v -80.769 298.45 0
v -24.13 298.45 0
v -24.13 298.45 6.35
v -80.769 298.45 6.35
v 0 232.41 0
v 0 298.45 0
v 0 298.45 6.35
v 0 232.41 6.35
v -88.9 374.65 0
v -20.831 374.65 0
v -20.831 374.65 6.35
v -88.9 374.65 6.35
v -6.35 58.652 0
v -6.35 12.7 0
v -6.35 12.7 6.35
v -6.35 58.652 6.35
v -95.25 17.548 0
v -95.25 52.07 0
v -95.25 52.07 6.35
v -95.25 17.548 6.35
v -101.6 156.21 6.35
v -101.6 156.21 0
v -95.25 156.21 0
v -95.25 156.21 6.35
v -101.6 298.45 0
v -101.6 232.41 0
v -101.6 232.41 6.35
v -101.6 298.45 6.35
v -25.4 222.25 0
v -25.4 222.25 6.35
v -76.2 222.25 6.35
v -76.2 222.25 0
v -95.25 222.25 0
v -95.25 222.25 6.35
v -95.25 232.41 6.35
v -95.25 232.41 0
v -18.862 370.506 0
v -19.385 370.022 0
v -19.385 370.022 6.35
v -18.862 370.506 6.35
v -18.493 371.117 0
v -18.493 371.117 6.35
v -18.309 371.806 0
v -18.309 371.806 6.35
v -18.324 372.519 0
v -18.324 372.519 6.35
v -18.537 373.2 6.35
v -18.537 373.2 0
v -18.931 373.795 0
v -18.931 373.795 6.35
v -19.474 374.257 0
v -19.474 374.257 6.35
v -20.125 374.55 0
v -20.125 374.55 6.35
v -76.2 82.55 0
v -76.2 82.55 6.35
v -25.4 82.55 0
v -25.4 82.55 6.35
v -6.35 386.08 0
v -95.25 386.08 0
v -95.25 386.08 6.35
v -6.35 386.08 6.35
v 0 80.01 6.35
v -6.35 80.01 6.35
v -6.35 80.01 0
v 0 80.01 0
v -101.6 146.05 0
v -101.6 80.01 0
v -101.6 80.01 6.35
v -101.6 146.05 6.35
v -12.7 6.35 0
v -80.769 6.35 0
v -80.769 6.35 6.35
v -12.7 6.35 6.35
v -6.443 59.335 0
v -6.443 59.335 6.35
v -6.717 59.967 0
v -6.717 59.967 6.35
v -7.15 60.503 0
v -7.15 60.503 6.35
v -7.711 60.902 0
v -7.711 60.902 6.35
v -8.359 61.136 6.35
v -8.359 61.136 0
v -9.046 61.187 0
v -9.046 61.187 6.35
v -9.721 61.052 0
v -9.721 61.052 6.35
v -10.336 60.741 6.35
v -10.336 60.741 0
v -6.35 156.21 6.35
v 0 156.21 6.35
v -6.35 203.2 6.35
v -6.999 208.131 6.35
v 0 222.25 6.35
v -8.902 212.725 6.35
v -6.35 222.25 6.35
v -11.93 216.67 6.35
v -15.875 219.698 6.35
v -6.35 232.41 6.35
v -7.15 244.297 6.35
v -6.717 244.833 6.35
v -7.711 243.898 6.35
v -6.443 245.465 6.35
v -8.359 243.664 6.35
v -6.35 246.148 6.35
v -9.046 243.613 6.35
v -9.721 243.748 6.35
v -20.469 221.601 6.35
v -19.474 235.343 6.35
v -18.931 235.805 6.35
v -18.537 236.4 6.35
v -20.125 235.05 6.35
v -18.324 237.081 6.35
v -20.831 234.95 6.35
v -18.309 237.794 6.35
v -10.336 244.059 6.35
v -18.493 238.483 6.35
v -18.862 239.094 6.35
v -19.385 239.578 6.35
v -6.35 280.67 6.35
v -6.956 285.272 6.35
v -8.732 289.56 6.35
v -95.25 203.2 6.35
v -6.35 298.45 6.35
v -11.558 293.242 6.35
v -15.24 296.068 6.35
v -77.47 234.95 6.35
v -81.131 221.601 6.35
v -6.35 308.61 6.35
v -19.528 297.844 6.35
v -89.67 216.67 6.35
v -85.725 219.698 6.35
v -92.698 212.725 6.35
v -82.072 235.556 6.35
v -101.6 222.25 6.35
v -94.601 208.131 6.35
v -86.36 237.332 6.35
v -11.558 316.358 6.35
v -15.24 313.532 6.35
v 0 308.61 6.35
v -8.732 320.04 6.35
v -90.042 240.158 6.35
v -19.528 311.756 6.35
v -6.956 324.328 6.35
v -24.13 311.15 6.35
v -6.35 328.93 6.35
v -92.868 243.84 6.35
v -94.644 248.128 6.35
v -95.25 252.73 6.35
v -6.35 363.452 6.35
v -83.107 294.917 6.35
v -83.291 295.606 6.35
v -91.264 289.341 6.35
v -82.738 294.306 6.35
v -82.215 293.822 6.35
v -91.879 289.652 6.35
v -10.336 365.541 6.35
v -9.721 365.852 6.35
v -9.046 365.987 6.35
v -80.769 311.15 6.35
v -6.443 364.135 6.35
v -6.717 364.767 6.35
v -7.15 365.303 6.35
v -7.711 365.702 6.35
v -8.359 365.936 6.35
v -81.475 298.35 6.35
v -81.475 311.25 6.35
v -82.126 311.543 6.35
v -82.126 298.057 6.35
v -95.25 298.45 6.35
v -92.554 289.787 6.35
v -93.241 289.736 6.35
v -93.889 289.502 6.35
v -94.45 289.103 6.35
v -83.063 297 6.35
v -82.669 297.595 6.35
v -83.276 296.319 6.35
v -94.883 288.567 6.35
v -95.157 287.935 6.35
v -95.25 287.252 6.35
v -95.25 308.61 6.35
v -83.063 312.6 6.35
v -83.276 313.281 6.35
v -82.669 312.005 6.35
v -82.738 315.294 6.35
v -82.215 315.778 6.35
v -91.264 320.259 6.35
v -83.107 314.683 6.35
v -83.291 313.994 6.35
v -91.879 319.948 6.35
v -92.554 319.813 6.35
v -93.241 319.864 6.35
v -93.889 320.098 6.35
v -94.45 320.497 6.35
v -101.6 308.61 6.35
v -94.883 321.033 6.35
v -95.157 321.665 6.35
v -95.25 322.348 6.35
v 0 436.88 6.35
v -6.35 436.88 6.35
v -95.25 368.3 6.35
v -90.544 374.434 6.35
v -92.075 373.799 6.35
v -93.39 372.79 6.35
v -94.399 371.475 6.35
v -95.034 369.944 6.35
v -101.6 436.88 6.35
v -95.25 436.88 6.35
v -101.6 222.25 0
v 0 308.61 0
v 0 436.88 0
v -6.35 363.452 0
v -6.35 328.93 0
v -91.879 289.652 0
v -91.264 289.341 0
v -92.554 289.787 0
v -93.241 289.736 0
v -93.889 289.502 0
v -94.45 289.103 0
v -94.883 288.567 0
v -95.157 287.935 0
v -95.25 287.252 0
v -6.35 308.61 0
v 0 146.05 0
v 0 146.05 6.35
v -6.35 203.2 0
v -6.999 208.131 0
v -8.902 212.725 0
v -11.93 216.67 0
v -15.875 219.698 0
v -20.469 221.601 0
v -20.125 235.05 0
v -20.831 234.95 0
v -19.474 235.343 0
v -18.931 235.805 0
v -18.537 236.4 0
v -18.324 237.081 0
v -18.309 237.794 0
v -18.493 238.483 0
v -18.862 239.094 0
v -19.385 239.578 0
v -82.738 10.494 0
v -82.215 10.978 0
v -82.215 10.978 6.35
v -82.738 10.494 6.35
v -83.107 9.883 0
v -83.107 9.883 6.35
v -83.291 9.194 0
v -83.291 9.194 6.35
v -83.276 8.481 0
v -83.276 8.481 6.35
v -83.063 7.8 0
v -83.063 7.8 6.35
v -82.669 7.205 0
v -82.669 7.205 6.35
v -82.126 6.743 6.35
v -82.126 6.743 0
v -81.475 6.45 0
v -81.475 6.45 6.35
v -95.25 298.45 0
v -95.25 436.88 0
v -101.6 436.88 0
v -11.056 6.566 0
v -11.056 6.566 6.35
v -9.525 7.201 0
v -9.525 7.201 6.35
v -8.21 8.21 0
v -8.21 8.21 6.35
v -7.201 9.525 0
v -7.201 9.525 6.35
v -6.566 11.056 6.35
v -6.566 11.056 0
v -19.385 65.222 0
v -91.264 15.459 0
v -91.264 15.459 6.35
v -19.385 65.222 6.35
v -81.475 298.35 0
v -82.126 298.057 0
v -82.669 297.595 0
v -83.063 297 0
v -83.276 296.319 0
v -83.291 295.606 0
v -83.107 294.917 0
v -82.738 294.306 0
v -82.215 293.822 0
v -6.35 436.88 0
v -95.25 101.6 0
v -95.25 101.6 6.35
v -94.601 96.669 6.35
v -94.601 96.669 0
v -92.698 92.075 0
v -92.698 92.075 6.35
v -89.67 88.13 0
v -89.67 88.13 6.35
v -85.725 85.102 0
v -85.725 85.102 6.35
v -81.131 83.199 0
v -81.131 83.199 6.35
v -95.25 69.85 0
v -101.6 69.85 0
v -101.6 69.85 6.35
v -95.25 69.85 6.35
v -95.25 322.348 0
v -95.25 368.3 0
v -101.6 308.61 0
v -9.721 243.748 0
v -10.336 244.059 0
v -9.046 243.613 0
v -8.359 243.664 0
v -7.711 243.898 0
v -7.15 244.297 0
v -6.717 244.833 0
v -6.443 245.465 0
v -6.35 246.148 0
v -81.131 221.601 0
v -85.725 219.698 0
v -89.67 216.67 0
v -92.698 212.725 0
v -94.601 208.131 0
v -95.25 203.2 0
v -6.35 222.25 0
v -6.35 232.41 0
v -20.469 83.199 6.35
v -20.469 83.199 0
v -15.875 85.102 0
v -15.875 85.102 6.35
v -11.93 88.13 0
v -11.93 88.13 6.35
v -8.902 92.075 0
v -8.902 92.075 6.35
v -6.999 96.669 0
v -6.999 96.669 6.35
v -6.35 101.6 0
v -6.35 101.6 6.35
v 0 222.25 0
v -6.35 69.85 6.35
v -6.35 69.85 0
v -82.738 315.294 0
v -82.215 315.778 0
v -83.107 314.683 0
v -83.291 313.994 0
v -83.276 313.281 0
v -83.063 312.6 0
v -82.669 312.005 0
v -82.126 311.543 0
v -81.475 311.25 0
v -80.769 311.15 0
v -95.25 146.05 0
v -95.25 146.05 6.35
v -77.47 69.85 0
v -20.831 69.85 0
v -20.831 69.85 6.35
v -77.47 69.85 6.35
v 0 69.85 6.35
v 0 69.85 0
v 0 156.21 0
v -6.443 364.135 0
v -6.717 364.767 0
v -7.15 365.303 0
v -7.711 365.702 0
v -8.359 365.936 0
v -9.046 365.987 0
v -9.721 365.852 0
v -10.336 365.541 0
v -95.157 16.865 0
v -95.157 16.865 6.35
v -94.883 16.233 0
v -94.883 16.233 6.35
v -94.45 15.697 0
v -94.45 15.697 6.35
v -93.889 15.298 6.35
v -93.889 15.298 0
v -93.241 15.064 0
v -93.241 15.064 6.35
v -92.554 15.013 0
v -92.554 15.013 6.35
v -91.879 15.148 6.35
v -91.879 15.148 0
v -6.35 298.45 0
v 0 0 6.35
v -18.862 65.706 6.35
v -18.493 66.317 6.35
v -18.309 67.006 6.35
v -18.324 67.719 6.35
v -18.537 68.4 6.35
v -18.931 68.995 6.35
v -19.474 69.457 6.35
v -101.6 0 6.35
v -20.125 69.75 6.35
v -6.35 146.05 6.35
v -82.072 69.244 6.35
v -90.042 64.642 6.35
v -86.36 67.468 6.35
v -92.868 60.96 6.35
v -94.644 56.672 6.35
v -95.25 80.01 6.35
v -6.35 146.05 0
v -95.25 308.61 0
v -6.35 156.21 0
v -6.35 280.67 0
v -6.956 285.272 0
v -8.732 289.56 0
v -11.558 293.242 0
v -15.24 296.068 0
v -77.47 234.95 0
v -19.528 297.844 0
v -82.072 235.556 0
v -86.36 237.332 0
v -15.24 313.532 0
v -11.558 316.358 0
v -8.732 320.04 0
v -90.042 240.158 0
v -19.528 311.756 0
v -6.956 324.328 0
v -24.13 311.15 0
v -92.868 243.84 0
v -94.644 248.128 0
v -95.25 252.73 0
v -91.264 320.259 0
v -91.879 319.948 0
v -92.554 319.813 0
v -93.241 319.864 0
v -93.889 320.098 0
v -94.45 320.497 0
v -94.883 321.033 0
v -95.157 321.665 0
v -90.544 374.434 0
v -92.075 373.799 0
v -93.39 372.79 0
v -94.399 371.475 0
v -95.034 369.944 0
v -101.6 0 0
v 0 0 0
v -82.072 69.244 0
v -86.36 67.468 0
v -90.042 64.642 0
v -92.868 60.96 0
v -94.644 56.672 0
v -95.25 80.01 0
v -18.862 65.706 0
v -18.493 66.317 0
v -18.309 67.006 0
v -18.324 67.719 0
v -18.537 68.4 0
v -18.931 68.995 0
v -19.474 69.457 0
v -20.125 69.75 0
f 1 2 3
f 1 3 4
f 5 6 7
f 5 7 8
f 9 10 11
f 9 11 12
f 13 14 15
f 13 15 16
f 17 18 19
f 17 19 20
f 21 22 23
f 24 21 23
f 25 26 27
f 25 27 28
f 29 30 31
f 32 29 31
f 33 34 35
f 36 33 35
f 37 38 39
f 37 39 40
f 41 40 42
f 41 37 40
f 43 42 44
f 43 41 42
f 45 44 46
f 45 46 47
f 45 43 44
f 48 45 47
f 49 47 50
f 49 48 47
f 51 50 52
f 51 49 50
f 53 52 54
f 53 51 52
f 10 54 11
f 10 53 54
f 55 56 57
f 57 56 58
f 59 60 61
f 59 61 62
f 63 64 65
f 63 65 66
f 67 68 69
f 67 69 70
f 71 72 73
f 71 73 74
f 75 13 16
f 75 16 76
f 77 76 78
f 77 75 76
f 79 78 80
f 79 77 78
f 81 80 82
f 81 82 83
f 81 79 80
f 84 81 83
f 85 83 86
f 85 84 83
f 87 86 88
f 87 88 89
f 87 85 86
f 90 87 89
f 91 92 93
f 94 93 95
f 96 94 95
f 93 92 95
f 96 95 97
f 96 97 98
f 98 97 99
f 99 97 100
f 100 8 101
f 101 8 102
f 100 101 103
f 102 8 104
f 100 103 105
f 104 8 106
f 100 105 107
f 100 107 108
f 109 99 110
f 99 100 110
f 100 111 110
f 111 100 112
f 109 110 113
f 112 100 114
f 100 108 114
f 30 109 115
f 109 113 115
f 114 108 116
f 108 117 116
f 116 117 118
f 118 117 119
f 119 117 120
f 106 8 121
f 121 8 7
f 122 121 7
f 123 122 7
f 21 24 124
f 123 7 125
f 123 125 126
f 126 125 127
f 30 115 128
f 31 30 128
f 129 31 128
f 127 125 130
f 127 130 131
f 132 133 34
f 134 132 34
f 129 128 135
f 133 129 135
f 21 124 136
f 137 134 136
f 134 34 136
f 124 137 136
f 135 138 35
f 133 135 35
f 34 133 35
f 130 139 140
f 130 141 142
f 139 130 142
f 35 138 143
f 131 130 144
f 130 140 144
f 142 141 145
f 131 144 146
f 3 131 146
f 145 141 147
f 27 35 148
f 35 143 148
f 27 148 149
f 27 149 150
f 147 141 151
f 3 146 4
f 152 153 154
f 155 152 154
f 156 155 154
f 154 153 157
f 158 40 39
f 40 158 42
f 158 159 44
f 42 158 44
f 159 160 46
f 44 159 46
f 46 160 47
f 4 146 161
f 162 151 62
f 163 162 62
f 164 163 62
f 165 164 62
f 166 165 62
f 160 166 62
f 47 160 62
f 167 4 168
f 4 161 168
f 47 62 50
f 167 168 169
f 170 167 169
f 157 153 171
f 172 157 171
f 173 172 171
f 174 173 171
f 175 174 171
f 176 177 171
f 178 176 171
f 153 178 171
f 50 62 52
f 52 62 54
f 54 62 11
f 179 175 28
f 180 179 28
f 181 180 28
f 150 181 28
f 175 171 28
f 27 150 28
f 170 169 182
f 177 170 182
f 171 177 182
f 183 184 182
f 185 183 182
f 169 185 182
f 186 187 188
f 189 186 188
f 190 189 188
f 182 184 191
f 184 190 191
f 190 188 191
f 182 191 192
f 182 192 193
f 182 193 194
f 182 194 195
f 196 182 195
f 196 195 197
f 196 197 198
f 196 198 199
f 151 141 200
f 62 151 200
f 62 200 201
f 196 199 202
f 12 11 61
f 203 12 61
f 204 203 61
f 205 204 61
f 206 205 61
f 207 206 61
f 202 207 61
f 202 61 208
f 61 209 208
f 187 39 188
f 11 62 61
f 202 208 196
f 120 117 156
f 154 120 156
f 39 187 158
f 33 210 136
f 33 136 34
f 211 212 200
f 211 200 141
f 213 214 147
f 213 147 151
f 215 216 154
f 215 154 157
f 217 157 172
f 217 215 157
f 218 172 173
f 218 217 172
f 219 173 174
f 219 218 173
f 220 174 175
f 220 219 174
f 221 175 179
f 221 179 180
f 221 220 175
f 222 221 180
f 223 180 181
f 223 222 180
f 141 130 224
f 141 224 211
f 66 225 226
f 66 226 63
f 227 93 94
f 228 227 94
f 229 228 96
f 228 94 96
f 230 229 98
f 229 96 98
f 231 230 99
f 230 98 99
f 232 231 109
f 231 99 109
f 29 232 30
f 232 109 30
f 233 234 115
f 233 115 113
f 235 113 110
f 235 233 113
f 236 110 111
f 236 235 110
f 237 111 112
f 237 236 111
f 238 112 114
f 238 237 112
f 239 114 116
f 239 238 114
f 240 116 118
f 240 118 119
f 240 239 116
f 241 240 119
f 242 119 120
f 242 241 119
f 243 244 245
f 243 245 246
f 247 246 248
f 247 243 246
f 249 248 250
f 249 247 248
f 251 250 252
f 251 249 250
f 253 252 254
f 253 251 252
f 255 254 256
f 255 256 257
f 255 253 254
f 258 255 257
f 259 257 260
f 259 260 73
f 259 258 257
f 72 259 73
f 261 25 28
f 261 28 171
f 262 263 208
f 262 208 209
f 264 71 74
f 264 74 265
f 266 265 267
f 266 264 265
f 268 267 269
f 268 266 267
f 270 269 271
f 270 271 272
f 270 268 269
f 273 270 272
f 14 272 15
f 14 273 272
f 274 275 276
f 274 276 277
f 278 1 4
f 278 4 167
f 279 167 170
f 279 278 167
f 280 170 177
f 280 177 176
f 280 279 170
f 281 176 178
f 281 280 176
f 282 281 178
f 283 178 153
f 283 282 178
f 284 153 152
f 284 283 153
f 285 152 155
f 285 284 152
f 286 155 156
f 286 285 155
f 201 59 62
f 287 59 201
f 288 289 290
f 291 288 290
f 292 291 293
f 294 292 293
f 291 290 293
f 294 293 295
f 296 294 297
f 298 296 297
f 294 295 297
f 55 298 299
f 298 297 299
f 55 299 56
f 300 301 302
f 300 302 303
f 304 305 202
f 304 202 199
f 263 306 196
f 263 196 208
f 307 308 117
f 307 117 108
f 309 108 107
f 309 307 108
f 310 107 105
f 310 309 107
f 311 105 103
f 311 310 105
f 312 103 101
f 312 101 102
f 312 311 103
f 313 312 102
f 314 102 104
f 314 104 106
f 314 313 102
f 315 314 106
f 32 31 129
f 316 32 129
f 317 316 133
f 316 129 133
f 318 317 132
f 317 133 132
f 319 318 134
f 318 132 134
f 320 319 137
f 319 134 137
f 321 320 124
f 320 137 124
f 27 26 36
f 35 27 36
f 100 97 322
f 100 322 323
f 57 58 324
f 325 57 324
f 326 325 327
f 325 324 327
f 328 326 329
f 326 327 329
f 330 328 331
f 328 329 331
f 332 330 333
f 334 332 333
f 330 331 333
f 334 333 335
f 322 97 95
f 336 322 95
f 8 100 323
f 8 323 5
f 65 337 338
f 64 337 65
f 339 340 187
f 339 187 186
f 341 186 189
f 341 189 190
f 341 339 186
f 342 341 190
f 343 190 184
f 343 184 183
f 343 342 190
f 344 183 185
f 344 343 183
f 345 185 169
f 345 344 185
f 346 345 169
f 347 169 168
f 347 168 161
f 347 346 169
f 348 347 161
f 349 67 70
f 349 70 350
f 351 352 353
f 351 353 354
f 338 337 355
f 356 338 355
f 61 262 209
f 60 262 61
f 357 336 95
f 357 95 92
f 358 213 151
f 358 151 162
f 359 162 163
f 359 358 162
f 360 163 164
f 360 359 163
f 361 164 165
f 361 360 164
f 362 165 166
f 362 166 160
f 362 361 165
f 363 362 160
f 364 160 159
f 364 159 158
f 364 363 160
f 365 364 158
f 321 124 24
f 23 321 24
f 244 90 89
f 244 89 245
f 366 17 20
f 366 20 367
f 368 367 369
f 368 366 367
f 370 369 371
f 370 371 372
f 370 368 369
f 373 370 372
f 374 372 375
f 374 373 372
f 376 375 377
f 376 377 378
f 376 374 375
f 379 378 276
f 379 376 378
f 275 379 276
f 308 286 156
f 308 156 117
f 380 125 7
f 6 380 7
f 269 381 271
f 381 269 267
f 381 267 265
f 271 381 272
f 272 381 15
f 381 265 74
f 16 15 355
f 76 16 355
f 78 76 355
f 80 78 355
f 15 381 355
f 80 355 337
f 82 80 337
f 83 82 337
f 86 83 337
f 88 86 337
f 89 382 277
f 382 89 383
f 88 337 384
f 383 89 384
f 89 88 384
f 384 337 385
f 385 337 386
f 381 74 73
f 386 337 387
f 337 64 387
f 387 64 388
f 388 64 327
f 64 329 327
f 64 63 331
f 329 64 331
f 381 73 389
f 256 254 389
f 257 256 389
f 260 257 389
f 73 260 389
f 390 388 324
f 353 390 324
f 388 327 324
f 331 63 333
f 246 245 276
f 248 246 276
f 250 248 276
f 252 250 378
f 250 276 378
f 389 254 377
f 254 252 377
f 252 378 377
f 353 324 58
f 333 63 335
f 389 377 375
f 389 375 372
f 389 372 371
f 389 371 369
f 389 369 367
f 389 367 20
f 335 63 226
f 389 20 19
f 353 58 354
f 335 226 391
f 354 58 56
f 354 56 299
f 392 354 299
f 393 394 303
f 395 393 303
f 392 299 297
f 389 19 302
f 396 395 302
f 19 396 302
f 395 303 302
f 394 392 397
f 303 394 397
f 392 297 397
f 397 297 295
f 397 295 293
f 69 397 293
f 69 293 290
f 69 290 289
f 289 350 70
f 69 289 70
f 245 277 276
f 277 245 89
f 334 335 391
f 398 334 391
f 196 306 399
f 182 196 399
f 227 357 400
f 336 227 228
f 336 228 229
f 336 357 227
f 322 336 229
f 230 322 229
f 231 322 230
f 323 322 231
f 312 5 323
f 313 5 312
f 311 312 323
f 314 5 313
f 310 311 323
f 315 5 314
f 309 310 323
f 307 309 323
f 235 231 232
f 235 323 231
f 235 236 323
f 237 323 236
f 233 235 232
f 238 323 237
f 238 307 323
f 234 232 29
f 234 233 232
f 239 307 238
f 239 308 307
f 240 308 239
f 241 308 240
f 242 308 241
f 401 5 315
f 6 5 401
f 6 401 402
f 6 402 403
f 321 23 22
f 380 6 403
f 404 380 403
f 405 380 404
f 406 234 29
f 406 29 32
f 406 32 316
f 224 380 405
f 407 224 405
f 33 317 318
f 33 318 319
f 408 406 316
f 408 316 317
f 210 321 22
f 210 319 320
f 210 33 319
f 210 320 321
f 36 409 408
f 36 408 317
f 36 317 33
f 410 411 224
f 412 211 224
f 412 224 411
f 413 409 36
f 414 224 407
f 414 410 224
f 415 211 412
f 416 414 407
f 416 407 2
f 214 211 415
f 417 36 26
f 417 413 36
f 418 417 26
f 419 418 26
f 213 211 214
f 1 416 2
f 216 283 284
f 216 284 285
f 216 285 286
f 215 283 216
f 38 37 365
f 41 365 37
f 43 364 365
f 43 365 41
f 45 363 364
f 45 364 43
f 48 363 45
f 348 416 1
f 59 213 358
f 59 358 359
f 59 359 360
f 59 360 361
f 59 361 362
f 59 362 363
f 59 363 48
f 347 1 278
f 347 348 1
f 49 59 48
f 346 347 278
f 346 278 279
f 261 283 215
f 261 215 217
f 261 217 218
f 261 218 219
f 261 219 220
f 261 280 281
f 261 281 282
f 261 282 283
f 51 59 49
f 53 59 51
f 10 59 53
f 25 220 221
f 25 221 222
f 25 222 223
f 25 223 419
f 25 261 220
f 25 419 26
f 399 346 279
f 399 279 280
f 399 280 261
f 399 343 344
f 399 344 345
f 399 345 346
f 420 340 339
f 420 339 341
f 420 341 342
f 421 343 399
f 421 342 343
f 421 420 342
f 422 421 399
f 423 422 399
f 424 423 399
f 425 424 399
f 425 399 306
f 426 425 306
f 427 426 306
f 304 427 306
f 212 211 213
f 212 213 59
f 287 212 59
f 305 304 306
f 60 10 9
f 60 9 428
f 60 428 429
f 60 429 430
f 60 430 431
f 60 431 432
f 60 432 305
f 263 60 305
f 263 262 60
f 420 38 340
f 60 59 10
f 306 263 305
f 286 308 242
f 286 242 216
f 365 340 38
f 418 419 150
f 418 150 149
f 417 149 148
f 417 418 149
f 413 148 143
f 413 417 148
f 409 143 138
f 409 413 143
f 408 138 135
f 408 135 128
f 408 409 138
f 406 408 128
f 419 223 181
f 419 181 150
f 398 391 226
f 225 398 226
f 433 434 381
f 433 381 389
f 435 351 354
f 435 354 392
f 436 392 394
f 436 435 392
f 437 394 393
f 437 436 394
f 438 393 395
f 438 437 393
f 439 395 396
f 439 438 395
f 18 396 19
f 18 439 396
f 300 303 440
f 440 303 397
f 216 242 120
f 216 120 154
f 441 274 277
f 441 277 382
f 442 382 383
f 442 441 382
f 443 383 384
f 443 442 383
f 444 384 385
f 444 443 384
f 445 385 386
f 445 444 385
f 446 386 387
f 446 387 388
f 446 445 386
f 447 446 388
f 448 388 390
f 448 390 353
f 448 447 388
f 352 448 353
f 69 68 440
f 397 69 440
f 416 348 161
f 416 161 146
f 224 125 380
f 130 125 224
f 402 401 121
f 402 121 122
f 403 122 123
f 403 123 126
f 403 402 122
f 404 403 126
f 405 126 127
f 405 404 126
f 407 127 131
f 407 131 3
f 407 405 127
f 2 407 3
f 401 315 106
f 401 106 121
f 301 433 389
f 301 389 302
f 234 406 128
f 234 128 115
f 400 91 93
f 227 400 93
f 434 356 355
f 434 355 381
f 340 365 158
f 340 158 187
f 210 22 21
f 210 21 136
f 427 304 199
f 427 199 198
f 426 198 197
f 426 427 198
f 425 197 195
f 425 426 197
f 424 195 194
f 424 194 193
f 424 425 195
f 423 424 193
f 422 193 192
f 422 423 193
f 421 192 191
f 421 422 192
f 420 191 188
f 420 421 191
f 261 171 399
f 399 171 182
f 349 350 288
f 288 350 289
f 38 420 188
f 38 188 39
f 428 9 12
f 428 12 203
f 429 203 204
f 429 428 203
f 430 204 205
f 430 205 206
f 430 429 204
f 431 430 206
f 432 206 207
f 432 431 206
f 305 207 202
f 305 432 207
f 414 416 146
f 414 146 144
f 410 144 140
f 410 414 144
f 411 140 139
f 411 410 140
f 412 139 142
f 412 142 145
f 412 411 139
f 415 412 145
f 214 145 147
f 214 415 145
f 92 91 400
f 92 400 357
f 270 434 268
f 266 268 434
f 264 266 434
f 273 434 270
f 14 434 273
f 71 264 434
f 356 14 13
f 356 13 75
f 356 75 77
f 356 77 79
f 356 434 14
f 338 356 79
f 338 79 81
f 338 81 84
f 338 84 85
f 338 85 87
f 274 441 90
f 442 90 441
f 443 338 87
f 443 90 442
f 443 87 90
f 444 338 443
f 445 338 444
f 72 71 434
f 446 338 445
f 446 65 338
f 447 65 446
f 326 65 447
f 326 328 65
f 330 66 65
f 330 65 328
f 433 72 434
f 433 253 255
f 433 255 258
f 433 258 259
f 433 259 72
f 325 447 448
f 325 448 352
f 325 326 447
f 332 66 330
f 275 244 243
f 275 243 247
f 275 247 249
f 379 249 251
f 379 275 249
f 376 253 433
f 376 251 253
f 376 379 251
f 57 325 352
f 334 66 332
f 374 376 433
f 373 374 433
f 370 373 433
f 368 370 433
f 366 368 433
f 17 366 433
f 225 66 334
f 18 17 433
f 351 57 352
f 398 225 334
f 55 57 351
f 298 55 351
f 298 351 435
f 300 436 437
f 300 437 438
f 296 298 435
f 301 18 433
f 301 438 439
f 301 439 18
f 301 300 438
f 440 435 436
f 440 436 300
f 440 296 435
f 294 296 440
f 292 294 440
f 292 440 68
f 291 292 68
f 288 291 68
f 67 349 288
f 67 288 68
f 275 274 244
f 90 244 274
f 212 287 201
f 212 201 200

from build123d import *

# Parameters (mm, degrees)
BOSS_EXTRUDE1_DEPTH = 6.35
CUT_EXTRUDE1_DEPTH  = 6.35
SKETCH2_W           = 6.35
SKETCH2_H           = 10.16
CUT_EXTRUDE2_DEPTH  = 6.35


with BuildPart() as part:
    # Model → Boss-Extrude1 (new body)
    with BuildSketch(Plane.XY):
        Polygon((-95.25, 386.08), (-6.35, 386.08), (-6.35, 436.88), (0, 436.88), (0, 0), (-101.6, 0), (-101.6, 436.88), (-95.25, 436.88), align=None)
        with BuildLine():
            Line((-80.76878597, 311.15), (-24.13, 311.15))
            ThreePointArc((-24.13, 311.15), (-11.557641431, 316.357641431), (-6.35, 328.93))
            Line((-6.35, 328.93), (-6.35, 363.45223644))
            ThreePointArc((-6.35, 363.45223644), (-7.711169032, 365.702115893), (-10.335793346, 365.540604607))
            Line((-10.335793346, 365.540604607), (-82.214579316, 315.778368167))
            ThreePointArc((-82.214579316, 315.778368167), (-83.193250358, 312.932654354), (-80.76878597, 311.15))
        make_face(mode=Mode.SUBTRACT)
        with BuildLine():
            Line((-95.25, 287.25223644), (-95.25, 252.73))
            ThreePointArc((-95.25, 252.73), (-90.042358569, 240.157641431), (-77.47, 234.95))
            Line((-77.47, 234.95), (-20.83121403, 234.95))
            ThreePointArc((-20.83121403, 234.95), (-18.406749642, 236.732654354), (-19.385420684, 239.578368167))
            Line((-19.385420684, 239.578368167), (-91.264206654, 289.340604607))
            ThreePointArc((-91.264206654, 289.340604607), (-93.888830968, 289.502115893), (-95.25, 287.25223644))
        make_face(mode=Mode.SUBTRACT)
        with BuildLine():
            Line((-82.214579316, 293.821631833), (-10.335793346, 244.059395393))
            ThreePointArc((-10.335793346, 244.059395393), (-7.711169032, 243.897884107), (-6.35, 246.14776356))
            Line((-6.35, 246.14776356), (-6.35, 280.67))
            ThreePointArc((-6.35, 280.67), (-11.557641431, 293.242358569), (-24.13, 298.45))
            Line((-24.13, 298.45), (-80.76878597, 298.45))
            ThreePointArc((-80.76878597, 298.45), (-83.193250358, 296.667345646), (-82.214579316, 293.821631833))
        make_face(mode=Mode.SUBTRACT)
        with BuildLine():
            Line((-80.76878597, 6.35), (-12.7, 6.35))
            ThreePointArc((-12.7, 6.35), (-8.209871939, 8.209871939), (-6.35, 12.7))
            Line((-6.35, 12.7), (-6.35, 58.65223644))
            ThreePointArc((-6.35, 58.65223644), (-7.711169032, 60.902115893), (-10.335793346, 60.740604607))
            Line((-10.335793346, 60.740604607), (-82.214579316, 10.978368167))
            ThreePointArc((-82.214579316, 10.978368167), (-83.193250358, 8.132654354), (-80.76878597, 6.35))
        make_face(mode=Mode.SUBTRACT)
        with BuildLine():
            Line((-20.83121403, 69.85), (-77.47, 69.85))
            ThreePointArc((-77.47, 69.85), (-90.042358569, 64.642358569), (-95.25, 52.07))
            Line((-95.25, 52.07), (-95.25, 17.54776356))
            ThreePointArc((-95.25, 17.54776356), (-93.888830968, 15.297884107), (-91.264206654, 15.459395393))
            Line((-91.264206654, 15.459395393), (-19.385420684, 65.221631833))
            ThreePointArc((-19.385420684, 65.221631833), (-18.406749642, 68.067345646), (-20.83121403, 69.85))
        make_face(mode=Mode.SUBTRACT)
        with BuildLine():
            Line((-20.83121403, 374.65), (-88.9, 374.65))
            ThreePointArc((-88.9, 374.65), (-93.390128061, 372.790128061), (-95.25, 368.3))
            Line((-95.25, 368.3), (-95.25, 322.34776356))
            ThreePointArc((-95.25, 322.34776356), (-93.888830968, 320.097884107), (-91.264206654, 320.259395393))
            Line((-91.264206654, 320.259395393), (-19.385420684, 370.021631833))
            ThreePointArc((-19.385420684, 370.021631833), (-18.406749642, 372.867345646), (-20.83121403, 374.65))
        make_face(mode=Mode.SUBTRACT)
    extrude(amount=BOSS_EXTRUDE1_DEPTH)

    # Sketch1 → Cut-Extrude1 (cut)
    with BuildSketch(Plane.XY.offset(6.35)):
        with BuildLine():
            Line((-95.25, 203.2), (-95.25, 101.6))
            ThreePointArc((-95.25, 101.6), (-89.670384182, 88.129615818), (-76.2, 82.55))
            Line((-76.2, 82.55), (-25.4, 82.55))
            ThreePointArc((-25.4, 82.55), (-11.929615818, 88.129615818), (-6.35, 101.6))
            Line((-6.35, 101.6), (-6.35, 203.2))
            ThreePointArc((-6.35, 203.2), (-11.929615818, 216.670384182), (-25.4, 222.25))
            Line((-25.4, 222.25), (-76.2, 222.25))
            ThreePointArc((-76.2, 222.25), (-89.670384182, 216.670384182), (-95.25, 203.2))
        make_face()
    extrude(amount=-CUT_EXTRUDE1_DEPTH, mode=Mode.SUBTRACT)

    # Sketch2 → Cut-Extrude2 (cut)
    with BuildSketch(Plane.XY.offset(6.35)):
        with Locations((-98.425, 74.93)):
            Rectangle(SKETCH2_W, SKETCH2_H)
        with Locations((-98.425, 151.13)):
            Rectangle(SKETCH2_W, SKETCH2_H)
        with Locations((-98.425, 227.33)):
            Rectangle(SKETCH2_W, SKETCH2_H)
        with Locations((-98.425, 303.53)):
            Rectangle(SKETCH2_W, SKETCH2_H)
        with Locations((-3.175, 303.53)):
            Rectangle(SKETCH2_W, SKETCH2_H)
        with Locations((-3.175, 227.33)):
            Rectangle(SKETCH2_W, SKETCH2_H)
        with Locations((-3.175, 151.13)):
            Rectangle(SKETCH2_W, SKETCH2_H)
        with Locations((-3.175, 74.93)):
            Rectangle(SKETCH2_W, SKETCH2_H)
    extrude(amount=-CUT_EXTRUDE2_DEPTH, mode=Mode.SUBTRACT)


with BuildPart() as cut_extrude2_piece_1:
    # of the separate pieces the step leaves, piece 1, a body of its own (cut_extrude2_pieces)
    add(part.part.solids().sort_by_distance((-95.25, 386.08, 0))[0])


with BuildPart() as cut_extrude2_piece_2:
    # of the separate pieces the step leaves, piece 2, a body of its own (cut_extrude2_pieces)
    add(part.part.solids().sort_by_distance((-101.6, 80.01, 0))[0])


solid = Compound([cut_extrude2_piece_1.part, cut_extrude2_piece_2.part])
